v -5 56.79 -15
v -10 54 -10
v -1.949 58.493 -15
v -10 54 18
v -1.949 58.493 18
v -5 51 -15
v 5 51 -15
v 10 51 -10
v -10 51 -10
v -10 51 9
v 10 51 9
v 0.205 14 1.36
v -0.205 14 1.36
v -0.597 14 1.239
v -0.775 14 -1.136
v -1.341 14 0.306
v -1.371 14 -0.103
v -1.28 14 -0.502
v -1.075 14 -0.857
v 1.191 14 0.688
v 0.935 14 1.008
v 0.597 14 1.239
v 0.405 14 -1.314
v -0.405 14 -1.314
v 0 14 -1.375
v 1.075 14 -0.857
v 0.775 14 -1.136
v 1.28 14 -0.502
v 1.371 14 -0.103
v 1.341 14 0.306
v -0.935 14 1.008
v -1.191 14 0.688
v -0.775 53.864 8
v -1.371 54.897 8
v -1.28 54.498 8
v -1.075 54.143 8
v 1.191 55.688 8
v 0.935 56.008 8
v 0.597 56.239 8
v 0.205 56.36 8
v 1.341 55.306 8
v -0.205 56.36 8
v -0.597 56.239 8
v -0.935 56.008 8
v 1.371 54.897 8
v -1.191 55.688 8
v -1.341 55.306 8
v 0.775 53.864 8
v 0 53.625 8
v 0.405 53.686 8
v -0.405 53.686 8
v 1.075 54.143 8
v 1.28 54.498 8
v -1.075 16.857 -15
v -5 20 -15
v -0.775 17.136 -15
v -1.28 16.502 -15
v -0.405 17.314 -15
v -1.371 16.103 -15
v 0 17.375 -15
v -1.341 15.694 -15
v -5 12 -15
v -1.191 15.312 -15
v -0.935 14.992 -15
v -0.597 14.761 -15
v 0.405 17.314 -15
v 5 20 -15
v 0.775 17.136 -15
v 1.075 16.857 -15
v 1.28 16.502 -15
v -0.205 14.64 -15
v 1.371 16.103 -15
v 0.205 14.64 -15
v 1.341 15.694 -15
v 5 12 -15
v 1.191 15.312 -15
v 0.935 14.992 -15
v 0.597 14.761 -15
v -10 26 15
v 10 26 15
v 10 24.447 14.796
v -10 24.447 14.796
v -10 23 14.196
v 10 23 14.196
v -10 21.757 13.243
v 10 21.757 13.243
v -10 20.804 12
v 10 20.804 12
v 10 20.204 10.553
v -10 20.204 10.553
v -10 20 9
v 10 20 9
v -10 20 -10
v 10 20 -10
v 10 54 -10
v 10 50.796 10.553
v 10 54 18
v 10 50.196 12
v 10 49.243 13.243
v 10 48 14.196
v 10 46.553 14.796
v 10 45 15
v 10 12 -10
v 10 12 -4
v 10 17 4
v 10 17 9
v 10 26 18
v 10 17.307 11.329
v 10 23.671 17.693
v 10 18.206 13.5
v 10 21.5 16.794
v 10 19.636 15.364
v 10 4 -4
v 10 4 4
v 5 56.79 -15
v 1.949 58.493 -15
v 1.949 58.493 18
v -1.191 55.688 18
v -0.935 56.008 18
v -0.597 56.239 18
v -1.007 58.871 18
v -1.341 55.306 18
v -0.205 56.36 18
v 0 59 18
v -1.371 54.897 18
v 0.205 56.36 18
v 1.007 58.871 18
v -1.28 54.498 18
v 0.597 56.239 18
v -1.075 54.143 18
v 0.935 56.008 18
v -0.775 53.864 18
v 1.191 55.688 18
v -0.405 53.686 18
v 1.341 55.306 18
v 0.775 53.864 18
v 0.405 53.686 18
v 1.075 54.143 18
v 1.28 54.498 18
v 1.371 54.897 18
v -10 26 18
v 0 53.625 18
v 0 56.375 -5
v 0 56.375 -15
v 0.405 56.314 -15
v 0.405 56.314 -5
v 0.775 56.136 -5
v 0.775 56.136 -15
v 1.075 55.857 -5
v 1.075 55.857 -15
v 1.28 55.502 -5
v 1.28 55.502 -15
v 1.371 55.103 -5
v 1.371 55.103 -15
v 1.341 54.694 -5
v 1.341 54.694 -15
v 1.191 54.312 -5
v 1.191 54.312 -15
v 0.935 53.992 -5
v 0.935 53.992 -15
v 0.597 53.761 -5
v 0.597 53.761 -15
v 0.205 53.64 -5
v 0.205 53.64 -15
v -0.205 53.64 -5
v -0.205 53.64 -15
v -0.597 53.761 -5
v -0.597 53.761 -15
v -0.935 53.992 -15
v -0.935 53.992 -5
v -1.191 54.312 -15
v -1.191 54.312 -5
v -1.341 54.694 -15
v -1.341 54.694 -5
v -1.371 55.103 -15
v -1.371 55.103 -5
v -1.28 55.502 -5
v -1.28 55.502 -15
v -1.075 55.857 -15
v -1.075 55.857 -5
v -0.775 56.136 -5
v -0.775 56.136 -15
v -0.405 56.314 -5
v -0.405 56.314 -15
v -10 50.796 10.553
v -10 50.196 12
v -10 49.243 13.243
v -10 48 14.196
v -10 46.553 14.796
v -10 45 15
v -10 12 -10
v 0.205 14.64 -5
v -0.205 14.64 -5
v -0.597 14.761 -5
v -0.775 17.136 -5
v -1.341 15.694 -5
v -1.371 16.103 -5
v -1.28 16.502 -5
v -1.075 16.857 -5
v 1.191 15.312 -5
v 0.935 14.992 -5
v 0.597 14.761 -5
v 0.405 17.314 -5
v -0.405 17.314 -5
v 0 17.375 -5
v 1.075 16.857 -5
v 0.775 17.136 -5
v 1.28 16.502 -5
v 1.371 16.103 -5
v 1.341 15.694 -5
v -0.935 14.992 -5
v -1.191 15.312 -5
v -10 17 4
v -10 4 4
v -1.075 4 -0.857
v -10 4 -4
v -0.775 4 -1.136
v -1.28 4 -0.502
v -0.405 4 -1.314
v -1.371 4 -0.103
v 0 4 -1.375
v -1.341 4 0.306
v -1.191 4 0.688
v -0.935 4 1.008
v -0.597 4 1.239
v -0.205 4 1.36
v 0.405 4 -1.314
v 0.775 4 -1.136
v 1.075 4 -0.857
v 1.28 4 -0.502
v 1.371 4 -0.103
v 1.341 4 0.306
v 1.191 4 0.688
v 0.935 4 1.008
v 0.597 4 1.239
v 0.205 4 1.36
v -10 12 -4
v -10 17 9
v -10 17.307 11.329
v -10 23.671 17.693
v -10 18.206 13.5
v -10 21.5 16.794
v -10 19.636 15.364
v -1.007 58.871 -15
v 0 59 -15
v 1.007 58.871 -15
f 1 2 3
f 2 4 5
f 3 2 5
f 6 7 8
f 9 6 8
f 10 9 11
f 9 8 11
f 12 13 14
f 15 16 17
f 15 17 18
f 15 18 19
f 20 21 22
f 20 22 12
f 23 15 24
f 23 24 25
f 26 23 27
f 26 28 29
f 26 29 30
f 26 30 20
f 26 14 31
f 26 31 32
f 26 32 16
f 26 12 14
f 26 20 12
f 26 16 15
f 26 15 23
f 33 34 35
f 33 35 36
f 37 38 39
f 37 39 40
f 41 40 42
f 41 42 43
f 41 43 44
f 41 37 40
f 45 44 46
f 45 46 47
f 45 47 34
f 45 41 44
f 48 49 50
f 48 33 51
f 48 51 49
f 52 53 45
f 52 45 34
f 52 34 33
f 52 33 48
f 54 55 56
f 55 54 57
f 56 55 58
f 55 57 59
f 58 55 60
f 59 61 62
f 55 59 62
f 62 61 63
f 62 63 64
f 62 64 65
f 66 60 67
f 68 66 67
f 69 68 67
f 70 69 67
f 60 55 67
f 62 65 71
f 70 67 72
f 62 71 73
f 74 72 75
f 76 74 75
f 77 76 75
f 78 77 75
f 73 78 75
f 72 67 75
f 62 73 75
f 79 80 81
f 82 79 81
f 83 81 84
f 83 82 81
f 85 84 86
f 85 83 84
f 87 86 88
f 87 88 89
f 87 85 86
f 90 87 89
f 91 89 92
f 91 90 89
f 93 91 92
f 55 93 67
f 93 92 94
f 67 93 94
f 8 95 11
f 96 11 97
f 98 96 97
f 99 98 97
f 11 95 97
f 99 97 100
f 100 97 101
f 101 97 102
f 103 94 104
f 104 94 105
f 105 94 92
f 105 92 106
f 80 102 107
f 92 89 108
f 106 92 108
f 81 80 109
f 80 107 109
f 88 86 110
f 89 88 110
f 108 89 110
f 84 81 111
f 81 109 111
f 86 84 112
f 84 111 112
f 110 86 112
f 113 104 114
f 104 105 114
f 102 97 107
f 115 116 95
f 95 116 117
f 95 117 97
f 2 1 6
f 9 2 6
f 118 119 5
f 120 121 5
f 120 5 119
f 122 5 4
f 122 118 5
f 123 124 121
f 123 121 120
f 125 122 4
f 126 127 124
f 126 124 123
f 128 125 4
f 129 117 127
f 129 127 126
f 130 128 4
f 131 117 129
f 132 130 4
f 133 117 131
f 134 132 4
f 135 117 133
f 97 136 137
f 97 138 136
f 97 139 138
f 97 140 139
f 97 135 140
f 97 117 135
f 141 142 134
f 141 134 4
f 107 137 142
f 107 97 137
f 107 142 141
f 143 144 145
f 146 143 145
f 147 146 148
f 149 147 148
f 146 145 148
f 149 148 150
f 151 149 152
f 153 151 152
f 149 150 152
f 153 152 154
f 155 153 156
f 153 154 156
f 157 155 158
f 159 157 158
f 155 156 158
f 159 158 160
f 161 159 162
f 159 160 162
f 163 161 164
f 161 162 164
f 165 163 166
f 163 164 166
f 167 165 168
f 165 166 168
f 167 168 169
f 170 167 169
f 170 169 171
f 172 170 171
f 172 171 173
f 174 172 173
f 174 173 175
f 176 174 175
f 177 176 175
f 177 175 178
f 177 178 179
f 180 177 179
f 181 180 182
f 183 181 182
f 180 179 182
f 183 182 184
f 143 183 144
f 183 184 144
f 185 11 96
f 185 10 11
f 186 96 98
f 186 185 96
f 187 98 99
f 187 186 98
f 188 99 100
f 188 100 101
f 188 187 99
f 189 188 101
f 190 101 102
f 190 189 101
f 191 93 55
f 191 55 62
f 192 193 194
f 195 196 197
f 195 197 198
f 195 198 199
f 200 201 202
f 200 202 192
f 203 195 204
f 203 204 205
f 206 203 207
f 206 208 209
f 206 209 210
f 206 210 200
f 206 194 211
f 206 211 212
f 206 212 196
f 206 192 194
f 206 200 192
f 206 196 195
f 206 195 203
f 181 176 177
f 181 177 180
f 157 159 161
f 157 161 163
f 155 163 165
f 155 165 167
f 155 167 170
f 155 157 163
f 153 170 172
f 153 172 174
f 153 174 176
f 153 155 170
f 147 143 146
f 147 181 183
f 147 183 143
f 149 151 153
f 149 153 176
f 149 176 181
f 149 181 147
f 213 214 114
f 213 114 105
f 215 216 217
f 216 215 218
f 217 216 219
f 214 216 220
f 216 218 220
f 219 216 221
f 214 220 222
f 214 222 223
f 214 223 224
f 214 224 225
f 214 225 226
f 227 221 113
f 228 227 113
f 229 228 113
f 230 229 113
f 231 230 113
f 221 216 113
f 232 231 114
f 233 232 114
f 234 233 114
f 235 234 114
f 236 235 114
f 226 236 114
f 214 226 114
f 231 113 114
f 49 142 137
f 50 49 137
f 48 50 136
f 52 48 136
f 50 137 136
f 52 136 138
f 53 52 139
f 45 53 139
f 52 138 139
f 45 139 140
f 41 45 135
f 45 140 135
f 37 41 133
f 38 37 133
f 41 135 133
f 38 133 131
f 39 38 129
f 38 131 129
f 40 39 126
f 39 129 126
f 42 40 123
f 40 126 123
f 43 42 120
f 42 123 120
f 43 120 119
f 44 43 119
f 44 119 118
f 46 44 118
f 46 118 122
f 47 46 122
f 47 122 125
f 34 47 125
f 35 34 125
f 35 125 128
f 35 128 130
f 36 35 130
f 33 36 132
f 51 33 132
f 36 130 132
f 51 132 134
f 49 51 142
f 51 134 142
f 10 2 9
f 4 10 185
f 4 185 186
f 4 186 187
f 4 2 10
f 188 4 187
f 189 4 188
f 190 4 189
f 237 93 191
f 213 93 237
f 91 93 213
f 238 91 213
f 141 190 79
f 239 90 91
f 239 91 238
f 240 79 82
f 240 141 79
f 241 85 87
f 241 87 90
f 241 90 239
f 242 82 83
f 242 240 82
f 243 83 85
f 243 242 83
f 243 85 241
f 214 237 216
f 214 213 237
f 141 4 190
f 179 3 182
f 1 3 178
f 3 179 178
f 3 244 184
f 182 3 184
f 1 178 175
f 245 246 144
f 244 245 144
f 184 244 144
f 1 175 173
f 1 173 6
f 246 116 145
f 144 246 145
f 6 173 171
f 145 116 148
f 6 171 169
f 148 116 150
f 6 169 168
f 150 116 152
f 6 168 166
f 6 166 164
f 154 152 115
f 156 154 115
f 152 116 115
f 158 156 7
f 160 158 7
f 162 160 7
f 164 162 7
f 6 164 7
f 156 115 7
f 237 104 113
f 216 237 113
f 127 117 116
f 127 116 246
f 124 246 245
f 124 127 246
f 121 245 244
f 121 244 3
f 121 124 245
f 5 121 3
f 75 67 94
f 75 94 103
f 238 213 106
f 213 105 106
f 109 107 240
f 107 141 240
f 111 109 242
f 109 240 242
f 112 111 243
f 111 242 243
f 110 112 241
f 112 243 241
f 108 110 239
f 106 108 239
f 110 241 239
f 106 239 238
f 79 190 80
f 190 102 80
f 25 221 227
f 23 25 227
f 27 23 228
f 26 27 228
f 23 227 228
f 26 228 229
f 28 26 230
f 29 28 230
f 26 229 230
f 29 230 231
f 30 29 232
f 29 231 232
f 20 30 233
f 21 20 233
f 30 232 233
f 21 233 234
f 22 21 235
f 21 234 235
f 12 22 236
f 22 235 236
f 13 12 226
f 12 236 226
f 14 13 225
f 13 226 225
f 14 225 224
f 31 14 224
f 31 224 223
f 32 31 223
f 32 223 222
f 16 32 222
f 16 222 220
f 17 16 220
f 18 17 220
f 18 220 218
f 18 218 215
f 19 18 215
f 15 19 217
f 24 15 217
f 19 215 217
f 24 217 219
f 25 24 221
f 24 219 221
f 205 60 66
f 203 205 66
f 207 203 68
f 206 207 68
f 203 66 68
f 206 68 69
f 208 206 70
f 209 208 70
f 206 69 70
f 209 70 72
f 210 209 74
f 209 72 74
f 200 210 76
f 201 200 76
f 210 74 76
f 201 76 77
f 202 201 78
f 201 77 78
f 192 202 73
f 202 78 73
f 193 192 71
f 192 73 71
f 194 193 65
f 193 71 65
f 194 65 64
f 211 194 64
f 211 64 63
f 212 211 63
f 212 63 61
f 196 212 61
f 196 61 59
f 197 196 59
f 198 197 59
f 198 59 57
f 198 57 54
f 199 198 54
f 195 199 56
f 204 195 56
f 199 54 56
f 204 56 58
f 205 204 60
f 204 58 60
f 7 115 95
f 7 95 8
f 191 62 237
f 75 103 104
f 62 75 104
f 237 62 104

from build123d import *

# Parameters (mm, degrees)
PAD_DEPTH       = 10
SKETCH001_R     = 1.375
POCKET_DEPTH    = 10
PAD001_DEPTH    = 33
SKETCH003_R     = 1.375
POCKET001_DEPTH = 10
SKETCH004_R     = 1.375
POCKET002_DEPTH = 10
FILLET_1_R      = 9
FILLET_2_R      = 6
CHAMFER_SIZE    = 5


with BuildPart() as part:
    # Sketch → Pad (new body, symmetric)
    with BuildSketch(Plane.YZ):
        Polygon((4, 4), (17, 4), (17, 18), (54, 18), (54, -15), (51, -15), (51, 15), (20, 15), (20, -15), (12, -15), (12, -4), (4, -4), align=None)
    extrude(amount=PAD_DEPTH, both=True)

    # Sketch001 → Pocket (cut)
    with BuildSketch(Plane(origin=(0, 4, 0), x_dir=(0, 0, -1), z_dir=(0, -1, 0))):
        Circle(SKETCH001_R)
    extrude(amount=-POCKET_DEPTH, mode=Mode.SUBTRACT)

    # Sketch002 → Pad001 (new body)
    with BuildSketch(Plane(origin=(0, 0, 18), x_dir=(0, -1, 0), z_dir=(0, 0, 1))):
        with BuildLine():
            ThreePointArc((-58.492889, 1.949289), (-59, 0), (-58.492889, -1.949289))
            Line((-54, -10), (-58.492889, -1.949289))
            Line((-54, 10), (-54, -10))
            Line((-58.492889, 1.949289), (-54, 10))
        make_face()
    extrude(amount=-PAD001_DEPTH)

    # Sketch003 → Pocket001 (cut)
    with BuildSketch(Plane(origin=(0, 0, 18), x_dir=(0, -1, 0), z_dir=(0, 0, 1))):
        with Locations((-55, 0)):
            Circle(SKETCH003_R)
    extrude(amount=-POCKET001_DEPTH, mode=Mode.SUBTRACT)

    # Sketch004 → Pocket002 (cut)
    with BuildSketch(Plane.YX.offset(15)):
        with Locations((55, 0)):
            Circle(SKETCH004_R)
        with Locations((16, 0)):
            Circle(SKETCH004_R)
    extrude(amount=-POCKET002_DEPTH, mode=Mode.SUBTRACT)

    # Fillet 1
    fillet_1_edges = [part.edges().sort_by_distance(p)[0] for p in [
        (0, 17, 18),
    ]]
    fillet(fillet_1_edges, radius=FILLET_1_R)

    # Fillet 2
    fillet_2_edges = [part.edges().sort_by_distance(p)[0] for p in [
        (0, 20, 15),
        (0, 51, 15),
    ]]
    fillet(fillet_2_edges, radius=FILLET_2_R)

    # Chamfer
    chamfer_edges = [part.edges().sort_by_distance(p)[0] for p in [
        (-10, 52.5, -15),
        (-10, 16, -15),
        (10, 52.5, -15),
        (10, 16, -15),
    ]]
    chamfer(chamfer_edges, length=CHAMFER_SIZE)


solid = part.part
